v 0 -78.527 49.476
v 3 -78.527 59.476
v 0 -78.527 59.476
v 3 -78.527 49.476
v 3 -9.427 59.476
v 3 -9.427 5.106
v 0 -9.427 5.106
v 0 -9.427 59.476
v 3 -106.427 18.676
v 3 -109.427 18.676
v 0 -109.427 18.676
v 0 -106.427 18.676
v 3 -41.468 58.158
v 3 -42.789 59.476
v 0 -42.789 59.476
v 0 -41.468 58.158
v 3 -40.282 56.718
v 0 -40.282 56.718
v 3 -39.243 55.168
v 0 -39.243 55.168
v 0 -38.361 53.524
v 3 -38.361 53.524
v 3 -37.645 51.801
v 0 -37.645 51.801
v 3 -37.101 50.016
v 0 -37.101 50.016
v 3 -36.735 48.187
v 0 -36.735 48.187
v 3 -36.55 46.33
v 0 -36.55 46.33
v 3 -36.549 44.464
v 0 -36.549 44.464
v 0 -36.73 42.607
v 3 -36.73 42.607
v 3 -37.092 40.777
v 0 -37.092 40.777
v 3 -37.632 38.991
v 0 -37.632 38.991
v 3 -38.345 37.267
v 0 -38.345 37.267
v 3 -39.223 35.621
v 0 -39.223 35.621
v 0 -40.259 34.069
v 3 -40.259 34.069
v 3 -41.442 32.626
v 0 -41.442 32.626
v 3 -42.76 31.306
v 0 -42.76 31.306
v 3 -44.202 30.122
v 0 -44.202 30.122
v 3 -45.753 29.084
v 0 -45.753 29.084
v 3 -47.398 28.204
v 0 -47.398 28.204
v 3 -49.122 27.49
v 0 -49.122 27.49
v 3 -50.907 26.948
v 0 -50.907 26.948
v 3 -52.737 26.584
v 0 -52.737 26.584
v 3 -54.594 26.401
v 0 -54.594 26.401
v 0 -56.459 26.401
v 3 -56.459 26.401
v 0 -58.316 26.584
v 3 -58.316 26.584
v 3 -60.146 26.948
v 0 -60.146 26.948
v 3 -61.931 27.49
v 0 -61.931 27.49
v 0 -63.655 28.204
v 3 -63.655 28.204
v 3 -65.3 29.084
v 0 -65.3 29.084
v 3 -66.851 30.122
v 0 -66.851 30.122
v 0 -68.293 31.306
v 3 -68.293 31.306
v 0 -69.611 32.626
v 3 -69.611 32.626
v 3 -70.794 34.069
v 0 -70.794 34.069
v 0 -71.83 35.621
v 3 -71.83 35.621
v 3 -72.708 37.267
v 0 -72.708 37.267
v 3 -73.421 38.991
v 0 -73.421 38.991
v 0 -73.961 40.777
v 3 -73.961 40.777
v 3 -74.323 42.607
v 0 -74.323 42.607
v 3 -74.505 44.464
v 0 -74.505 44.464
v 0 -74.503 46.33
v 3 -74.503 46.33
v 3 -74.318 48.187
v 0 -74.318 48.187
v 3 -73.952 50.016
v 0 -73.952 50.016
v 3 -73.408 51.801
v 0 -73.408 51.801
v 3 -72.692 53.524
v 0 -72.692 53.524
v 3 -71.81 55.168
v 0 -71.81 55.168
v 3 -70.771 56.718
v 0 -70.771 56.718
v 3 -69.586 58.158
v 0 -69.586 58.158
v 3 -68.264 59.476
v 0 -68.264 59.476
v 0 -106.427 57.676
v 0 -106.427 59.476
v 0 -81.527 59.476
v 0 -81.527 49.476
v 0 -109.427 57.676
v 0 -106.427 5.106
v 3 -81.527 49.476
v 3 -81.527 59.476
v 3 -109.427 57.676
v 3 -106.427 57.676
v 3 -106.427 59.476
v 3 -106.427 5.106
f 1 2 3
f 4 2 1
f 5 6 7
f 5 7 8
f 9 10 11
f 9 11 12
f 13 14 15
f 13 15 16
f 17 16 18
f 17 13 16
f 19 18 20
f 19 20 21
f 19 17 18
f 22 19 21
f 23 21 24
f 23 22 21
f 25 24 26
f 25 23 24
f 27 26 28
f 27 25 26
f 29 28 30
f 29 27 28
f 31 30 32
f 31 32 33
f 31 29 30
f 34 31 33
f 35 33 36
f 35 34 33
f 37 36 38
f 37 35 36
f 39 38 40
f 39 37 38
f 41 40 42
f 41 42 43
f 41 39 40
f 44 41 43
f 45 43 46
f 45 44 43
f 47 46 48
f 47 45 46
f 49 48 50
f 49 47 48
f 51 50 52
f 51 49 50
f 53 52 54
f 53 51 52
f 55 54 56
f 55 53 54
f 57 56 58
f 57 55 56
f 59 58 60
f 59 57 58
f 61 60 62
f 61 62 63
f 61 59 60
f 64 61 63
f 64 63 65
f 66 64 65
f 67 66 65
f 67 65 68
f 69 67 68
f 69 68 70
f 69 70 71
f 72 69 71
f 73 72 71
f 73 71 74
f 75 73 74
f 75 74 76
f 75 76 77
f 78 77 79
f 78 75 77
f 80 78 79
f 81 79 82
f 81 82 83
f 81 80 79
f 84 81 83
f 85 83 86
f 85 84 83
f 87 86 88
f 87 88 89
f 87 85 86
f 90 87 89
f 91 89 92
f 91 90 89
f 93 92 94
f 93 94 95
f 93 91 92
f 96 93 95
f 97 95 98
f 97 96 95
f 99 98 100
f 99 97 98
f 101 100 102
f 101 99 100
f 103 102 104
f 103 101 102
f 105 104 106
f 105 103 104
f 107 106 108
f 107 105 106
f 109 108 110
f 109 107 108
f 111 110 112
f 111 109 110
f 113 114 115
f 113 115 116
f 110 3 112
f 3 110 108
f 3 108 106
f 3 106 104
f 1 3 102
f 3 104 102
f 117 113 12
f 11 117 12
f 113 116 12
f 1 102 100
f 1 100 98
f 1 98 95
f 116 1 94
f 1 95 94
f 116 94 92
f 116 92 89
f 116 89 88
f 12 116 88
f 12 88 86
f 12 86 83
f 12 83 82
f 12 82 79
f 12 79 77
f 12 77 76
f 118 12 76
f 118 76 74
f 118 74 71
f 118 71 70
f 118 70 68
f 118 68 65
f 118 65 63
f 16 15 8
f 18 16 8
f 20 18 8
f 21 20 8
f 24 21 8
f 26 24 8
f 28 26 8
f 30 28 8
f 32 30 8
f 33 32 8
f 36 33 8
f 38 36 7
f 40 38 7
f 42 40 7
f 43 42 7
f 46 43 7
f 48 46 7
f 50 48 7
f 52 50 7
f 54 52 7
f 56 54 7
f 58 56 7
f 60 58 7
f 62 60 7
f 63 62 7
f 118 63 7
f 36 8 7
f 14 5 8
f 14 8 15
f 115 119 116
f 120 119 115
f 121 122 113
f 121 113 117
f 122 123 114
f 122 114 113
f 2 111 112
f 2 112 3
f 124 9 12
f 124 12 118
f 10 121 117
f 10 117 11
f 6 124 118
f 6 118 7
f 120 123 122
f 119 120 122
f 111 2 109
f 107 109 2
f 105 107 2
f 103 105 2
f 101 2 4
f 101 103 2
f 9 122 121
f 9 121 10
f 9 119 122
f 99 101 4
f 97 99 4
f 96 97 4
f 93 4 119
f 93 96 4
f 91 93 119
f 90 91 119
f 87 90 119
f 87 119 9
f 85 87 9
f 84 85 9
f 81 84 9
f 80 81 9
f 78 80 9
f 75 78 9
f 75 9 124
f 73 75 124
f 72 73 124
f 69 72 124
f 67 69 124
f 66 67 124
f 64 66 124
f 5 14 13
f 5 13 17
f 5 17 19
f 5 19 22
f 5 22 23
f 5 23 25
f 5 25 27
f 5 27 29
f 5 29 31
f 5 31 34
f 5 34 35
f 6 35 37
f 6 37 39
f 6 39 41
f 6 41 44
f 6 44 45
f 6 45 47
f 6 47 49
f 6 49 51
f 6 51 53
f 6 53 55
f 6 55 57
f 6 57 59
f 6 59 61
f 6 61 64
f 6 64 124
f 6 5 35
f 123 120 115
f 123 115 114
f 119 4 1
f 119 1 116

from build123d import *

# Parameters (mm, degrees)
BOSS_EXTRU_1_DEPTH = 3


with BuildPart() as part:
    # Esquisse1 → Boss.-Extru.1 (new body)
    with BuildSketch(Plane(origin=(3, 0, 0), x_dir=(0, 0, -1), z_dir=(1, 0, 0))):
        with BuildLine():
            Line((-5.105655505, -9.426547116), (-59.475655505, -9.426547116))
            Line((-59.475655505, -9.426547116), (-59.475655505, -42.788807913))
            ThreePointArc((-59.475655505, -42.788807913), (-26.377783326, -55.526547116), (-59.475655505, -68.264286319))
            Line((-59.475655505, -68.264286319), (-59.475655505, -78.526547116))
            Line((-59.475655505, -78.526547116), (-49.475655505, -78.526547116))
            Line((-49.475655505, -78.526547116), (-49.475655505, -81.526547116))
            Line((-49.475655505, -81.526547116), (-59.475655505, -81.526547116))
            Line((-59.475655505, -81.526547116), (-59.475655505, -106.426547116))
            Line((-59.475655505, -106.426547116), (-57.675655505, -106.426547116))
            Line((-57.675655505, -106.426547116), (-57.675655505, -109.426547116))
            Line((-57.675655505, -109.426547116), (-18.675655505, -109.426547116))
            Line((-18.675655505, -109.426547116), (-18.675655505, -106.426547116))
            Line((-18.675655505, -106.426547116), (-5.105655505, -106.426547116))
            Line((-5.105655505, -106.426547116), (-5.105655505, -9.426547116))
        make_face()
    extrude(amount=-BOSS_EXTRU_1_DEPTH)


solid = part.part
